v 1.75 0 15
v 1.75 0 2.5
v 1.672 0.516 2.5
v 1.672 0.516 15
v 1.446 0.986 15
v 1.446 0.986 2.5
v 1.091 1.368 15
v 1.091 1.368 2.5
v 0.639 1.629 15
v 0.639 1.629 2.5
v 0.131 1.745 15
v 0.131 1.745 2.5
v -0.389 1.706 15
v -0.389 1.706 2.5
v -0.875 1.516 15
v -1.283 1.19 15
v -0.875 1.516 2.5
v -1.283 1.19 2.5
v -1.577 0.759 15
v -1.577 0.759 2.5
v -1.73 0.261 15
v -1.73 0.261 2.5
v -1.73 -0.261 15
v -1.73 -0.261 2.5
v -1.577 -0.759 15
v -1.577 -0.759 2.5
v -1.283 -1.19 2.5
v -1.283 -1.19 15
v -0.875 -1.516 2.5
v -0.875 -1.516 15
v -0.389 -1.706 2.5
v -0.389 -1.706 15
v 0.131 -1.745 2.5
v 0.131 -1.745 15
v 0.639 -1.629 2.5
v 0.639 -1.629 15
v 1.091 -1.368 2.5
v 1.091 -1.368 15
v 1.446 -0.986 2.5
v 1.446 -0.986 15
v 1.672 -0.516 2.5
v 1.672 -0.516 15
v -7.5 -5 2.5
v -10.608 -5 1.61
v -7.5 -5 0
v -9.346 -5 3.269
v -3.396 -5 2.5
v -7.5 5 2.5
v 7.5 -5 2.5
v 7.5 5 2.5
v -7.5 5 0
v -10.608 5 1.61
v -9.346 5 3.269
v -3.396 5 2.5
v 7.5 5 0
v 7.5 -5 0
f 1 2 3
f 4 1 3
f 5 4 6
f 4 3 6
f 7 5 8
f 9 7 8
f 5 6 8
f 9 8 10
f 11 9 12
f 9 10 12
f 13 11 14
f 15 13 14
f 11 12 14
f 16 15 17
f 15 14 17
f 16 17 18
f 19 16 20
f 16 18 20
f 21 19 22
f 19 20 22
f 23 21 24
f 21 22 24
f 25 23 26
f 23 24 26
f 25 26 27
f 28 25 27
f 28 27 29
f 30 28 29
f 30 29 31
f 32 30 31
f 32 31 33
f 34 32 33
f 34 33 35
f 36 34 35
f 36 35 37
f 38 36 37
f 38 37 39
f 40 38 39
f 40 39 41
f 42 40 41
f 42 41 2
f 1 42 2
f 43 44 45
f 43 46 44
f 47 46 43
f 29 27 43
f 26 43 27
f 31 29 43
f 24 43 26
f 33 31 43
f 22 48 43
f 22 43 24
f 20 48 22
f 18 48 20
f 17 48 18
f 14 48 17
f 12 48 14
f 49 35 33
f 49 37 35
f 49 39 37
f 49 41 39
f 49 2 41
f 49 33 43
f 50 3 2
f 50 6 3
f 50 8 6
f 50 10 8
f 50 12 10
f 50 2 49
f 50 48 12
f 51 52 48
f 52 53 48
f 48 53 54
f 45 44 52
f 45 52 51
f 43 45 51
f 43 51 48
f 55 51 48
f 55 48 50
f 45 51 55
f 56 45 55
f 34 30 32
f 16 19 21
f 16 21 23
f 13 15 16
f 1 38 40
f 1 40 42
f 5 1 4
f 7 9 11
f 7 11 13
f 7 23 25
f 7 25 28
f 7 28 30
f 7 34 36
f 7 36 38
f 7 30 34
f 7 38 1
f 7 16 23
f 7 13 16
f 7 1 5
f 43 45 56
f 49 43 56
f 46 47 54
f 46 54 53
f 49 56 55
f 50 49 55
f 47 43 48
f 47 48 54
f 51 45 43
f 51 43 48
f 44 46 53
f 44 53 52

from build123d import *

# Parameters (mm, degrees)
F0_R     = 1.75
F1_DEPTH = 15
F0_W     = 15
F0_H     = 10
F2_DEPTH = 2.5
F4_DEPTH = 10


with BuildPart() as f1:
    # F0 (on Top) → F1 (new body)
    with BuildSketch(Plane.XY):
        Circle(F0_R)
    extrude(amount=F1_DEPTH)

    # F0 (on Top) → F2 (join)
    with BuildSketch(Plane.XY):
        Rectangle(F0_W, F0_H)
        Circle(F0_R, mode=Mode.SUBTRACT)
    extrude(amount=F2_DEPTH)


with BuildPart() as f4:
    # F3 (on face) → F4 (new body)
    with BuildSketch(Plane.XZ.offset(5)):
        Polygon((-10.607643, 1.610141), (-7.5, 0), (-7.5, 2.5), (-9.346238, 3.26903), align=None)
        Polygon((-9.346238, 3.26903), (-7.5, 2.5), (-3.395726, 2.5), align=None)
    extrude(amount=-F4_DEPTH)


solid = Compound([f1.part, f4.part])
